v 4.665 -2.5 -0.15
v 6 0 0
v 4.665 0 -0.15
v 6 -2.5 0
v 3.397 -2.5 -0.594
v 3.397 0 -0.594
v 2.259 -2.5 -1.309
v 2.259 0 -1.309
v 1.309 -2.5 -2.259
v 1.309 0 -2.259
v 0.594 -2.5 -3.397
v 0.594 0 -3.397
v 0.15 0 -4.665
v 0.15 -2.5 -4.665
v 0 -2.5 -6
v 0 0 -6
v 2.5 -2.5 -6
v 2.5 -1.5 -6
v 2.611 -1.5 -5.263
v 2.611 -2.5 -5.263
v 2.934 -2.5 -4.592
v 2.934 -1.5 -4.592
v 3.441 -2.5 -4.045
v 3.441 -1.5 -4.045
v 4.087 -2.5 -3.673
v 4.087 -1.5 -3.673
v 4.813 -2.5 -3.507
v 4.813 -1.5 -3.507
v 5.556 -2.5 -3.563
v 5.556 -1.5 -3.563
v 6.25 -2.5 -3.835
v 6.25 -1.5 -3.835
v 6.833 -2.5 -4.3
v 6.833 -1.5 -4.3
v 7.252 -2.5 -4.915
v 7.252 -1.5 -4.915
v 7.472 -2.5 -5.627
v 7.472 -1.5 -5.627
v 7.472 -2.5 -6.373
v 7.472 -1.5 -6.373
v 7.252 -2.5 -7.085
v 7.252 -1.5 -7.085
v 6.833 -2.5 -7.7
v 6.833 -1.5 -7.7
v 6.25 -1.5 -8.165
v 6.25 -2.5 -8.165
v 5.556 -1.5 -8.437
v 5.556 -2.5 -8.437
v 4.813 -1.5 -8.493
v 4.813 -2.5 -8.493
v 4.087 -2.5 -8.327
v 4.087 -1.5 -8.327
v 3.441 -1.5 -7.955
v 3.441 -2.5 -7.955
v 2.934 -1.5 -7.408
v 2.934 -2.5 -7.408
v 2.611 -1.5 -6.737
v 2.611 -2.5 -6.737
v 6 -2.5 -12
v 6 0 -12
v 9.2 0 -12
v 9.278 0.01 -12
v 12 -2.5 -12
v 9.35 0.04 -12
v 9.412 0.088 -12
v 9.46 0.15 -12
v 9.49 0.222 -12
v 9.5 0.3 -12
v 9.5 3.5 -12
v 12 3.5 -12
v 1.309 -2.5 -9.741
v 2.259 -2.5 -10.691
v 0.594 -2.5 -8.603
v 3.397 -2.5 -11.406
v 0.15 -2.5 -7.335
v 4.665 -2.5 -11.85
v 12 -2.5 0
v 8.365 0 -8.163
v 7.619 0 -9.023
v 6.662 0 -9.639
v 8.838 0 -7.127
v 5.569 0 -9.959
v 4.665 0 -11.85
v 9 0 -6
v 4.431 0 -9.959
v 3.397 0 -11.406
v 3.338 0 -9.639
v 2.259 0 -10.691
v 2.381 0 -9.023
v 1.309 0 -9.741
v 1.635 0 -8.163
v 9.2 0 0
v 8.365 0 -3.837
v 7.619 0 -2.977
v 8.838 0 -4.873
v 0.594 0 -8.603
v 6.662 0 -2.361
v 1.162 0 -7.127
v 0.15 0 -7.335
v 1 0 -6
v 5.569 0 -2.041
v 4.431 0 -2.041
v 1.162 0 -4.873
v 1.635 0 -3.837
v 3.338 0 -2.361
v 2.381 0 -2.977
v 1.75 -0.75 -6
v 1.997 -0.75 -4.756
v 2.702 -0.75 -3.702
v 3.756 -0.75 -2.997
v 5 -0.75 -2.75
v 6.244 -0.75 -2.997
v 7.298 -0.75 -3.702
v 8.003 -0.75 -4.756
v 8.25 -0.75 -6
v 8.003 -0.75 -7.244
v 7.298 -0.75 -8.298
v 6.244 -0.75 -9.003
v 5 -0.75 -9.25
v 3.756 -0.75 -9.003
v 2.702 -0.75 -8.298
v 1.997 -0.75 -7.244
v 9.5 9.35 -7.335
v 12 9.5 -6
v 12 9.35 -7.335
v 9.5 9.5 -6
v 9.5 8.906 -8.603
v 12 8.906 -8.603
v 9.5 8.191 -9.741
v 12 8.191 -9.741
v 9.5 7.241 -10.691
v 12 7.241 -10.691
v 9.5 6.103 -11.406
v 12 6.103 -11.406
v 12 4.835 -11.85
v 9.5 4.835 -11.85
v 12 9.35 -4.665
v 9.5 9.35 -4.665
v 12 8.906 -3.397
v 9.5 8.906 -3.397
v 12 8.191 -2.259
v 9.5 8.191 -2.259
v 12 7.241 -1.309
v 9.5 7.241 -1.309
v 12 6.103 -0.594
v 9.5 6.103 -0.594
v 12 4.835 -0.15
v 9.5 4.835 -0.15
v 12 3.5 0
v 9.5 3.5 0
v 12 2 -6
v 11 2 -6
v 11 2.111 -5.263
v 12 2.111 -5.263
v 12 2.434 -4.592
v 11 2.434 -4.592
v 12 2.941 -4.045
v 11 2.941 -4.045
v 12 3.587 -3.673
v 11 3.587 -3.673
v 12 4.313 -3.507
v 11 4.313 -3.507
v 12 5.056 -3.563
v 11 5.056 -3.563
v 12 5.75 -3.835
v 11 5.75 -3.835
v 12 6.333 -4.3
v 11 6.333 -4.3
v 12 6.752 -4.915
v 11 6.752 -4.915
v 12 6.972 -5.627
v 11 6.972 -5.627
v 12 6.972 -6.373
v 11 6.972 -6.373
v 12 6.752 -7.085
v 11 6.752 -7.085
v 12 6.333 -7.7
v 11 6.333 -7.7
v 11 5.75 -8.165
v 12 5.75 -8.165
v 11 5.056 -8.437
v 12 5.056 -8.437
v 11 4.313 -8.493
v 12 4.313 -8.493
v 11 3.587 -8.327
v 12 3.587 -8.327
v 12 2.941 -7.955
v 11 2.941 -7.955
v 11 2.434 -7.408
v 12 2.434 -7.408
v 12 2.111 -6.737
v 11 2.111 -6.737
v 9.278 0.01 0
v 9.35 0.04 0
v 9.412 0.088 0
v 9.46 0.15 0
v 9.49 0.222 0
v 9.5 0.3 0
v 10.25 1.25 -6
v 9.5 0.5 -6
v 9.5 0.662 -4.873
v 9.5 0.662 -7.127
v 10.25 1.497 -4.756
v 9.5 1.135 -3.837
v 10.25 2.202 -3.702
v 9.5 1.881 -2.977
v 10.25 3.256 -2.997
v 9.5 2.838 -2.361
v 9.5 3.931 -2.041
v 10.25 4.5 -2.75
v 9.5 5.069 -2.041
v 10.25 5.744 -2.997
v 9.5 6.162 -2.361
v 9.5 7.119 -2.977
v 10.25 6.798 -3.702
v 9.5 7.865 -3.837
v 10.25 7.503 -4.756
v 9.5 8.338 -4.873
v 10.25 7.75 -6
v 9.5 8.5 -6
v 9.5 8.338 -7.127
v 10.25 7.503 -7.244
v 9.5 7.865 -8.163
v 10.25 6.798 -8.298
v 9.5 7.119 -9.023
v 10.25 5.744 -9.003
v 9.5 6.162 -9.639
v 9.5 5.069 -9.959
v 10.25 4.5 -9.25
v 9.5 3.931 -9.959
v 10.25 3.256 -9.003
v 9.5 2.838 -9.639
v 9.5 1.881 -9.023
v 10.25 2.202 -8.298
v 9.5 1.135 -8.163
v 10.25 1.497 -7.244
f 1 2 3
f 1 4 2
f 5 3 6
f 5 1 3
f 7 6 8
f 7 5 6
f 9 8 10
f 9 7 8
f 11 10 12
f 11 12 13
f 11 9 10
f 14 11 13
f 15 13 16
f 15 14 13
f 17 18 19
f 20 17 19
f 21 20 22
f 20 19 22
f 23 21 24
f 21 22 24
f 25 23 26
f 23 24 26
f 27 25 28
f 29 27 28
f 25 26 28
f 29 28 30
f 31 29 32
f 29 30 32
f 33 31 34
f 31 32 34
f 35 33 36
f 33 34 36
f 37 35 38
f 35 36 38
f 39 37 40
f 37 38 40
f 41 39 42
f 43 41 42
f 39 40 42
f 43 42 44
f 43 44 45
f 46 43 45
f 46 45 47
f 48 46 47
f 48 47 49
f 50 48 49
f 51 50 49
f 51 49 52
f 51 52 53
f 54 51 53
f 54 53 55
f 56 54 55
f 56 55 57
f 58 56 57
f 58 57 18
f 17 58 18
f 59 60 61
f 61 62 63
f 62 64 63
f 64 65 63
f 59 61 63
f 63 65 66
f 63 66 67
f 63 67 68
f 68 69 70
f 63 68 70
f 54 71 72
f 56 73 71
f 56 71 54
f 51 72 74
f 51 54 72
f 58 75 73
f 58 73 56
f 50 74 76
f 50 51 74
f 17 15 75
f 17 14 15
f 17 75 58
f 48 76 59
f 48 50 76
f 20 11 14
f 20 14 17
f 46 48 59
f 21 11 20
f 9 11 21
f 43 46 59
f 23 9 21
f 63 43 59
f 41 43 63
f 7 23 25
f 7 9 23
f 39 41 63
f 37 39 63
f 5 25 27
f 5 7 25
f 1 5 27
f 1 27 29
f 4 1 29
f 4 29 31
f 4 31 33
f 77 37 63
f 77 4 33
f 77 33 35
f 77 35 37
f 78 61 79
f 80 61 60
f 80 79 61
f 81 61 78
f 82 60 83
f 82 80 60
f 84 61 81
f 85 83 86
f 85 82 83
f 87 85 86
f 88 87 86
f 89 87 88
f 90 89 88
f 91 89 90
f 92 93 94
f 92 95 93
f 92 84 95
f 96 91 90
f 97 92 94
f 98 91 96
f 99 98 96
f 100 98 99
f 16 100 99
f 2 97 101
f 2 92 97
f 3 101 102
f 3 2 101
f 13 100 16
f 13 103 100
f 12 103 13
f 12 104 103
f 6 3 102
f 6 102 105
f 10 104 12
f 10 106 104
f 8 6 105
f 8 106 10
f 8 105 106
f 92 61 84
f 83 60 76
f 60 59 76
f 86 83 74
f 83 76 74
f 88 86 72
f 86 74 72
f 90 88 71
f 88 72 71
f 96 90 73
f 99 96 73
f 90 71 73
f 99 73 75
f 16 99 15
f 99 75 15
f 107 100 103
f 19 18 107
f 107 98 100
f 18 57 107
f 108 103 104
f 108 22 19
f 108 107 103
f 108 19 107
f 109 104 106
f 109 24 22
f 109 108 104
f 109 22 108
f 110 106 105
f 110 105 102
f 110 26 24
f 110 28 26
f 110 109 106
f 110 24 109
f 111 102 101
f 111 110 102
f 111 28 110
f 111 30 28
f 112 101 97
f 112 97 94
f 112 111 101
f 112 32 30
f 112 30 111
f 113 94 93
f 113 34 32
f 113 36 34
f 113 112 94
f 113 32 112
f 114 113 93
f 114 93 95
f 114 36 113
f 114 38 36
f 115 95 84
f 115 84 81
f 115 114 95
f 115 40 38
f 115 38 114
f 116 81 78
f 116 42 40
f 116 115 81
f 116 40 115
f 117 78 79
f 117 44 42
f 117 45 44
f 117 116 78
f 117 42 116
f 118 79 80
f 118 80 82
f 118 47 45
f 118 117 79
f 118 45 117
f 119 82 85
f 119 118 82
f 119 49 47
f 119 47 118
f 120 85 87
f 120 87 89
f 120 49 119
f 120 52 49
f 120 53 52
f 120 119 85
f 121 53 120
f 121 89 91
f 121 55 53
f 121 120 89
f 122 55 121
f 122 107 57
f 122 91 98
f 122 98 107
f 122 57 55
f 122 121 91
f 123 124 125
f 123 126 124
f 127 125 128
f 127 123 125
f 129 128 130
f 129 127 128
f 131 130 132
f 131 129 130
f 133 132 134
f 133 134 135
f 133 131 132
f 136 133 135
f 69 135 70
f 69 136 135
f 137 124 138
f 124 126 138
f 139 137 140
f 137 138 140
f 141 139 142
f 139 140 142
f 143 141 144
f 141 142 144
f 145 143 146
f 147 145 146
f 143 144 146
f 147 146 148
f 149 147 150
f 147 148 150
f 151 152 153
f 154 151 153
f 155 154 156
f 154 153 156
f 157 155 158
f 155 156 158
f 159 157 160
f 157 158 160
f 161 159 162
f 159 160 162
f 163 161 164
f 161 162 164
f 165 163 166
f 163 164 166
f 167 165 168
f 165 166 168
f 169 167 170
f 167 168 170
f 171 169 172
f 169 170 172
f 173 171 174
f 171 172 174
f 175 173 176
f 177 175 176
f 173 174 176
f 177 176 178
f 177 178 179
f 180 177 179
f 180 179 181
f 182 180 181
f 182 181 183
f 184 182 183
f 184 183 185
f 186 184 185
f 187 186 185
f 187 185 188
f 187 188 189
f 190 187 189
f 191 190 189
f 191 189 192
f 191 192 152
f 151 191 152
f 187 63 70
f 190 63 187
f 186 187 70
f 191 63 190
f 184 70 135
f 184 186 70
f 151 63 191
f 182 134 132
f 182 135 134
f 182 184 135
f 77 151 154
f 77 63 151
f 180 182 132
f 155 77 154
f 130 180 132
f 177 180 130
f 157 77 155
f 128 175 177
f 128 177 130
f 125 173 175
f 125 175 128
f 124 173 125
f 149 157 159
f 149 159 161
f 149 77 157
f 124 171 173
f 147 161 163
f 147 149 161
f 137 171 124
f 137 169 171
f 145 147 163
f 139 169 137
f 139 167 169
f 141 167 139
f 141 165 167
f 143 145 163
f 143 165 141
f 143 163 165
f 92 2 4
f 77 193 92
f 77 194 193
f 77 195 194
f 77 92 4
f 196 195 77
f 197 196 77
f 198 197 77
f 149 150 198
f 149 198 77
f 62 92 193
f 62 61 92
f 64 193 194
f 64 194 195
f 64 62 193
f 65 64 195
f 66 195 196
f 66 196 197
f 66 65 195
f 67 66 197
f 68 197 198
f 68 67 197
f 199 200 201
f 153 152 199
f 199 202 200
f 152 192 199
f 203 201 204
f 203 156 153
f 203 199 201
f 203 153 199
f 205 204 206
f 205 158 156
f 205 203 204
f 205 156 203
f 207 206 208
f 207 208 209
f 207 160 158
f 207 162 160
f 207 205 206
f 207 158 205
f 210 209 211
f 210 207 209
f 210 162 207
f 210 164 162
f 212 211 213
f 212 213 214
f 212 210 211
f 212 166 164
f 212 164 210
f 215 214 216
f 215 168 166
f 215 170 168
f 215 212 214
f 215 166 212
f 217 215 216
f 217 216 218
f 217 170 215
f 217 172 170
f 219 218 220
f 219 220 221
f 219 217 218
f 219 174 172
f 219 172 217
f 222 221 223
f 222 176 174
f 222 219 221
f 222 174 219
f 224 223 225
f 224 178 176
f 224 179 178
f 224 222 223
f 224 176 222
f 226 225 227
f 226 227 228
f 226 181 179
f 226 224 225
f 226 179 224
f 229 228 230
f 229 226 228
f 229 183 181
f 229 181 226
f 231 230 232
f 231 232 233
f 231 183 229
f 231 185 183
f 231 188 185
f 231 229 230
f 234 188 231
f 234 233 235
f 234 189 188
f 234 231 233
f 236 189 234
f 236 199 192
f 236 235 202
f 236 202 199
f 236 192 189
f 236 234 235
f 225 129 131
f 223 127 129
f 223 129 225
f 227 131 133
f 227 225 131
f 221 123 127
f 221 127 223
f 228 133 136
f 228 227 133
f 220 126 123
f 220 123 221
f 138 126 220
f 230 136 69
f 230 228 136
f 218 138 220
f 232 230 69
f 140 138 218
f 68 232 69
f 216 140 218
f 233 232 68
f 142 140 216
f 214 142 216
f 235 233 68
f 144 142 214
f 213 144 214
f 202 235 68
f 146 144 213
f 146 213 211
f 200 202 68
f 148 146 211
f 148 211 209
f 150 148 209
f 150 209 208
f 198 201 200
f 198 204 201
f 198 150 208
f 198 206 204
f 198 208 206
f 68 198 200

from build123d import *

# Parameters (mm, degrees)
RESSALTO_EXTRUS_O1_DEPTH = 12
FILETE1_R                = 6
FILETE2_R                = 6
ESBO_O3_R                = 2.5
CORTE_EXTRUS_O1_DEPTH    = 20.448650339
FILETE3_R                = 0.3
ESBO_O4_R                = 2.5
CORTE_EXTRUS_O2_DEPTH    = 19.013883535
CHANFRO2_SIZE            = 1.5


with BuildPart() as part:
    # Esboço2 → Ressalto-extrusão1 (new body)
    with BuildSketch(Plane.XY):
        Polygon((0, 0), (0, -2.5), (12, -2.5), (12, 9.5), (9.5, 9.5), (9.5, 0), align=None)
    extrude(amount=-RESSALTO_EXTRUS_O1_DEPTH)

    # Filete1
    filete1_edges = [part.edges().sort_by_distance(p)[0] for p in [
        (10.75, 9.5, 0),
        (10.75, 9.5, -12),
    ]]
    fillet(filete1_edges, radius=FILETE1_R - 0.0001)  # a hair under: the kernel refuses the full size

    # Filete2
    filete2_edges = [part.edges().sort_by_distance(p)[0] for p in [
        (0, -1.25, 0),
        (0, -1.25, -12),
    ]]
    fillet(filete2_edges, radius=FILETE2_R - 0.0001)  # a hair under: the kernel refuses the full size

    # Esboço3 → Corte-extrusão1 (cut, through all)
    with BuildSketch(Plane(origin=(0, 0, 0), x_dir=(1, 0, 0), z_dir=(0, 1, 0))):
        with Locations(Location((5, 6, 0), (0, 0, 180))):
            Circle(ESBO_O3_R)
    extrude(amount=-CORTE_EXTRUS_O1_DEPTH, mode=Mode.SUBTRACT)

    # Filete3
    filete3_edges = [part.edges().sort_by_distance(p)[0] for p in [
        (9.5, 0, -6),
    ]]
    fillet(filete3_edges, radius=FILETE3_R)

    # Esboço4 → Corte-extrusão2 (cut, through all)
    with BuildSketch(Plane.ZY.offset(-9.5)):
        with Locations(Location((-6, 4.5, 0), (0, 0, 270))):
            Circle(ESBO_O4_R)
    extrude(amount=-CORTE_EXTRUS_O2_DEPTH, mode=Mode.SUBTRACT)

    # Chanfro2
    chanfro2_edges = [part.edges().sort_by_distance(p)[0] for p in [
        (7.5, 0, -6),
        (9.5, 7, -6),
    ]]
    chamfer(chanfro2_edges, length=CHANFRO2_SIZE)


solid = part.part
